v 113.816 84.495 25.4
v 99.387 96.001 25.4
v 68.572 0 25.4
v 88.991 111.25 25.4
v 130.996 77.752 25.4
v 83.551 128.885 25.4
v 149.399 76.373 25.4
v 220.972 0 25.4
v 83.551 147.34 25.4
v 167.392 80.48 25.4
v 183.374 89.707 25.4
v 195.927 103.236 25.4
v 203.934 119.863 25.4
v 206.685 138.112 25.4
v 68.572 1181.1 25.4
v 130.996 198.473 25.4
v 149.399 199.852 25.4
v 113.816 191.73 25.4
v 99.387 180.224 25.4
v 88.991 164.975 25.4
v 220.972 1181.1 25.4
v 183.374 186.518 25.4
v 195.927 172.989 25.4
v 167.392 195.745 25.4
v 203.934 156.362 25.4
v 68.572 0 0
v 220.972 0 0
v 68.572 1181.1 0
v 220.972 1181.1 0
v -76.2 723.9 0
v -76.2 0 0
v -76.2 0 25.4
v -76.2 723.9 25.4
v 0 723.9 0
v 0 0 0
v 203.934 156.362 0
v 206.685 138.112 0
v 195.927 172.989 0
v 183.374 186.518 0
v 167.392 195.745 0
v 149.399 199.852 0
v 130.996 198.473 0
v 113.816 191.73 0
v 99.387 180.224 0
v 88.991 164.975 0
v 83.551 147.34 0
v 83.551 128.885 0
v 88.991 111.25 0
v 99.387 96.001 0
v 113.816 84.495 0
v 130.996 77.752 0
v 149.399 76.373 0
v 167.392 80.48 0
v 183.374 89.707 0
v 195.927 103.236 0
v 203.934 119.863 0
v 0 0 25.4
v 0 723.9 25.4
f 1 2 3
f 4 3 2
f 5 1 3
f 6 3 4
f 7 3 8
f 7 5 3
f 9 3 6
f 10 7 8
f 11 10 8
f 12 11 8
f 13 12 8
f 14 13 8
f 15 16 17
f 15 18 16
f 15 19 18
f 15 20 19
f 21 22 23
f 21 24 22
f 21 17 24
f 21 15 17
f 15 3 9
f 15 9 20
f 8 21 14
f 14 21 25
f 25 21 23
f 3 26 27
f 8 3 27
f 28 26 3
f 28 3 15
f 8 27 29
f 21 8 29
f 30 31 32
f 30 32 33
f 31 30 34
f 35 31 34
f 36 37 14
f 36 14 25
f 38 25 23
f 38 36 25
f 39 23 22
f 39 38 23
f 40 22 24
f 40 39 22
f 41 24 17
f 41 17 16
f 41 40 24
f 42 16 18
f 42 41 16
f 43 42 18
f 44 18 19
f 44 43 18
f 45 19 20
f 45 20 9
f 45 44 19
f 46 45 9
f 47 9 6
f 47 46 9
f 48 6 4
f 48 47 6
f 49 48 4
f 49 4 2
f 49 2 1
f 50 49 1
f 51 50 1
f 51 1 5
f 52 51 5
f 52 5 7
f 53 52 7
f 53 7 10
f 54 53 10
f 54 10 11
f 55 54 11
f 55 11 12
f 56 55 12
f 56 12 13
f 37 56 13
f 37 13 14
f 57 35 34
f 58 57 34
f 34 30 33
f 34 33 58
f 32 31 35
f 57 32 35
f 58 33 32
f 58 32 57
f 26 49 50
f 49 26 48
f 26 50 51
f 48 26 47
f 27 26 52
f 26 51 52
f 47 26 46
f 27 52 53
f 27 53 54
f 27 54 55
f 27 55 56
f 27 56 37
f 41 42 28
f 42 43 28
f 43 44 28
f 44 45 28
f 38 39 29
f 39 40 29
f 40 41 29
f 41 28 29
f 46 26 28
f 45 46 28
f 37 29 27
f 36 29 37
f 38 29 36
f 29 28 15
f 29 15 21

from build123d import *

# Parameters (mm, degrees)
F0_W     = 152.4
F0_H     = 1181.1
F0_R     = 61.9125
F1_DEPTH = 6.35
F0_W_2   = 76.2
F0_H_2   = 723.9
F2_DEPTH = 25.4


with BuildPart() as f1:
    # F0 (on Top) → F1 (new body)
    with BuildSketch(Plane.XY):
        with Locations((144.772387, 590.55)):
            Rectangle(F0_W, F0_H)
        with Locations((144.772387, 138.1125)):
            Circle(F0_R, mode=Mode.SUBTRACT)
    extrude(amount=F1_DEPTH)

    # F0 (on Top) → F2 (join)
    with BuildSketch(Plane.XY):
        with Locations((-38.1, 361.95)):
            Rectangle(F0_W_2, F0_H_2)
        with Locations((144.772387, 590.55)):
            Rectangle(F0_W, F0_H)
        with Locations((144.772387, 138.1125)):
            Circle(F0_R, mode=Mode.SUBTRACT)
    extrude(amount=F2_DEPTH)


solid = f1.part
